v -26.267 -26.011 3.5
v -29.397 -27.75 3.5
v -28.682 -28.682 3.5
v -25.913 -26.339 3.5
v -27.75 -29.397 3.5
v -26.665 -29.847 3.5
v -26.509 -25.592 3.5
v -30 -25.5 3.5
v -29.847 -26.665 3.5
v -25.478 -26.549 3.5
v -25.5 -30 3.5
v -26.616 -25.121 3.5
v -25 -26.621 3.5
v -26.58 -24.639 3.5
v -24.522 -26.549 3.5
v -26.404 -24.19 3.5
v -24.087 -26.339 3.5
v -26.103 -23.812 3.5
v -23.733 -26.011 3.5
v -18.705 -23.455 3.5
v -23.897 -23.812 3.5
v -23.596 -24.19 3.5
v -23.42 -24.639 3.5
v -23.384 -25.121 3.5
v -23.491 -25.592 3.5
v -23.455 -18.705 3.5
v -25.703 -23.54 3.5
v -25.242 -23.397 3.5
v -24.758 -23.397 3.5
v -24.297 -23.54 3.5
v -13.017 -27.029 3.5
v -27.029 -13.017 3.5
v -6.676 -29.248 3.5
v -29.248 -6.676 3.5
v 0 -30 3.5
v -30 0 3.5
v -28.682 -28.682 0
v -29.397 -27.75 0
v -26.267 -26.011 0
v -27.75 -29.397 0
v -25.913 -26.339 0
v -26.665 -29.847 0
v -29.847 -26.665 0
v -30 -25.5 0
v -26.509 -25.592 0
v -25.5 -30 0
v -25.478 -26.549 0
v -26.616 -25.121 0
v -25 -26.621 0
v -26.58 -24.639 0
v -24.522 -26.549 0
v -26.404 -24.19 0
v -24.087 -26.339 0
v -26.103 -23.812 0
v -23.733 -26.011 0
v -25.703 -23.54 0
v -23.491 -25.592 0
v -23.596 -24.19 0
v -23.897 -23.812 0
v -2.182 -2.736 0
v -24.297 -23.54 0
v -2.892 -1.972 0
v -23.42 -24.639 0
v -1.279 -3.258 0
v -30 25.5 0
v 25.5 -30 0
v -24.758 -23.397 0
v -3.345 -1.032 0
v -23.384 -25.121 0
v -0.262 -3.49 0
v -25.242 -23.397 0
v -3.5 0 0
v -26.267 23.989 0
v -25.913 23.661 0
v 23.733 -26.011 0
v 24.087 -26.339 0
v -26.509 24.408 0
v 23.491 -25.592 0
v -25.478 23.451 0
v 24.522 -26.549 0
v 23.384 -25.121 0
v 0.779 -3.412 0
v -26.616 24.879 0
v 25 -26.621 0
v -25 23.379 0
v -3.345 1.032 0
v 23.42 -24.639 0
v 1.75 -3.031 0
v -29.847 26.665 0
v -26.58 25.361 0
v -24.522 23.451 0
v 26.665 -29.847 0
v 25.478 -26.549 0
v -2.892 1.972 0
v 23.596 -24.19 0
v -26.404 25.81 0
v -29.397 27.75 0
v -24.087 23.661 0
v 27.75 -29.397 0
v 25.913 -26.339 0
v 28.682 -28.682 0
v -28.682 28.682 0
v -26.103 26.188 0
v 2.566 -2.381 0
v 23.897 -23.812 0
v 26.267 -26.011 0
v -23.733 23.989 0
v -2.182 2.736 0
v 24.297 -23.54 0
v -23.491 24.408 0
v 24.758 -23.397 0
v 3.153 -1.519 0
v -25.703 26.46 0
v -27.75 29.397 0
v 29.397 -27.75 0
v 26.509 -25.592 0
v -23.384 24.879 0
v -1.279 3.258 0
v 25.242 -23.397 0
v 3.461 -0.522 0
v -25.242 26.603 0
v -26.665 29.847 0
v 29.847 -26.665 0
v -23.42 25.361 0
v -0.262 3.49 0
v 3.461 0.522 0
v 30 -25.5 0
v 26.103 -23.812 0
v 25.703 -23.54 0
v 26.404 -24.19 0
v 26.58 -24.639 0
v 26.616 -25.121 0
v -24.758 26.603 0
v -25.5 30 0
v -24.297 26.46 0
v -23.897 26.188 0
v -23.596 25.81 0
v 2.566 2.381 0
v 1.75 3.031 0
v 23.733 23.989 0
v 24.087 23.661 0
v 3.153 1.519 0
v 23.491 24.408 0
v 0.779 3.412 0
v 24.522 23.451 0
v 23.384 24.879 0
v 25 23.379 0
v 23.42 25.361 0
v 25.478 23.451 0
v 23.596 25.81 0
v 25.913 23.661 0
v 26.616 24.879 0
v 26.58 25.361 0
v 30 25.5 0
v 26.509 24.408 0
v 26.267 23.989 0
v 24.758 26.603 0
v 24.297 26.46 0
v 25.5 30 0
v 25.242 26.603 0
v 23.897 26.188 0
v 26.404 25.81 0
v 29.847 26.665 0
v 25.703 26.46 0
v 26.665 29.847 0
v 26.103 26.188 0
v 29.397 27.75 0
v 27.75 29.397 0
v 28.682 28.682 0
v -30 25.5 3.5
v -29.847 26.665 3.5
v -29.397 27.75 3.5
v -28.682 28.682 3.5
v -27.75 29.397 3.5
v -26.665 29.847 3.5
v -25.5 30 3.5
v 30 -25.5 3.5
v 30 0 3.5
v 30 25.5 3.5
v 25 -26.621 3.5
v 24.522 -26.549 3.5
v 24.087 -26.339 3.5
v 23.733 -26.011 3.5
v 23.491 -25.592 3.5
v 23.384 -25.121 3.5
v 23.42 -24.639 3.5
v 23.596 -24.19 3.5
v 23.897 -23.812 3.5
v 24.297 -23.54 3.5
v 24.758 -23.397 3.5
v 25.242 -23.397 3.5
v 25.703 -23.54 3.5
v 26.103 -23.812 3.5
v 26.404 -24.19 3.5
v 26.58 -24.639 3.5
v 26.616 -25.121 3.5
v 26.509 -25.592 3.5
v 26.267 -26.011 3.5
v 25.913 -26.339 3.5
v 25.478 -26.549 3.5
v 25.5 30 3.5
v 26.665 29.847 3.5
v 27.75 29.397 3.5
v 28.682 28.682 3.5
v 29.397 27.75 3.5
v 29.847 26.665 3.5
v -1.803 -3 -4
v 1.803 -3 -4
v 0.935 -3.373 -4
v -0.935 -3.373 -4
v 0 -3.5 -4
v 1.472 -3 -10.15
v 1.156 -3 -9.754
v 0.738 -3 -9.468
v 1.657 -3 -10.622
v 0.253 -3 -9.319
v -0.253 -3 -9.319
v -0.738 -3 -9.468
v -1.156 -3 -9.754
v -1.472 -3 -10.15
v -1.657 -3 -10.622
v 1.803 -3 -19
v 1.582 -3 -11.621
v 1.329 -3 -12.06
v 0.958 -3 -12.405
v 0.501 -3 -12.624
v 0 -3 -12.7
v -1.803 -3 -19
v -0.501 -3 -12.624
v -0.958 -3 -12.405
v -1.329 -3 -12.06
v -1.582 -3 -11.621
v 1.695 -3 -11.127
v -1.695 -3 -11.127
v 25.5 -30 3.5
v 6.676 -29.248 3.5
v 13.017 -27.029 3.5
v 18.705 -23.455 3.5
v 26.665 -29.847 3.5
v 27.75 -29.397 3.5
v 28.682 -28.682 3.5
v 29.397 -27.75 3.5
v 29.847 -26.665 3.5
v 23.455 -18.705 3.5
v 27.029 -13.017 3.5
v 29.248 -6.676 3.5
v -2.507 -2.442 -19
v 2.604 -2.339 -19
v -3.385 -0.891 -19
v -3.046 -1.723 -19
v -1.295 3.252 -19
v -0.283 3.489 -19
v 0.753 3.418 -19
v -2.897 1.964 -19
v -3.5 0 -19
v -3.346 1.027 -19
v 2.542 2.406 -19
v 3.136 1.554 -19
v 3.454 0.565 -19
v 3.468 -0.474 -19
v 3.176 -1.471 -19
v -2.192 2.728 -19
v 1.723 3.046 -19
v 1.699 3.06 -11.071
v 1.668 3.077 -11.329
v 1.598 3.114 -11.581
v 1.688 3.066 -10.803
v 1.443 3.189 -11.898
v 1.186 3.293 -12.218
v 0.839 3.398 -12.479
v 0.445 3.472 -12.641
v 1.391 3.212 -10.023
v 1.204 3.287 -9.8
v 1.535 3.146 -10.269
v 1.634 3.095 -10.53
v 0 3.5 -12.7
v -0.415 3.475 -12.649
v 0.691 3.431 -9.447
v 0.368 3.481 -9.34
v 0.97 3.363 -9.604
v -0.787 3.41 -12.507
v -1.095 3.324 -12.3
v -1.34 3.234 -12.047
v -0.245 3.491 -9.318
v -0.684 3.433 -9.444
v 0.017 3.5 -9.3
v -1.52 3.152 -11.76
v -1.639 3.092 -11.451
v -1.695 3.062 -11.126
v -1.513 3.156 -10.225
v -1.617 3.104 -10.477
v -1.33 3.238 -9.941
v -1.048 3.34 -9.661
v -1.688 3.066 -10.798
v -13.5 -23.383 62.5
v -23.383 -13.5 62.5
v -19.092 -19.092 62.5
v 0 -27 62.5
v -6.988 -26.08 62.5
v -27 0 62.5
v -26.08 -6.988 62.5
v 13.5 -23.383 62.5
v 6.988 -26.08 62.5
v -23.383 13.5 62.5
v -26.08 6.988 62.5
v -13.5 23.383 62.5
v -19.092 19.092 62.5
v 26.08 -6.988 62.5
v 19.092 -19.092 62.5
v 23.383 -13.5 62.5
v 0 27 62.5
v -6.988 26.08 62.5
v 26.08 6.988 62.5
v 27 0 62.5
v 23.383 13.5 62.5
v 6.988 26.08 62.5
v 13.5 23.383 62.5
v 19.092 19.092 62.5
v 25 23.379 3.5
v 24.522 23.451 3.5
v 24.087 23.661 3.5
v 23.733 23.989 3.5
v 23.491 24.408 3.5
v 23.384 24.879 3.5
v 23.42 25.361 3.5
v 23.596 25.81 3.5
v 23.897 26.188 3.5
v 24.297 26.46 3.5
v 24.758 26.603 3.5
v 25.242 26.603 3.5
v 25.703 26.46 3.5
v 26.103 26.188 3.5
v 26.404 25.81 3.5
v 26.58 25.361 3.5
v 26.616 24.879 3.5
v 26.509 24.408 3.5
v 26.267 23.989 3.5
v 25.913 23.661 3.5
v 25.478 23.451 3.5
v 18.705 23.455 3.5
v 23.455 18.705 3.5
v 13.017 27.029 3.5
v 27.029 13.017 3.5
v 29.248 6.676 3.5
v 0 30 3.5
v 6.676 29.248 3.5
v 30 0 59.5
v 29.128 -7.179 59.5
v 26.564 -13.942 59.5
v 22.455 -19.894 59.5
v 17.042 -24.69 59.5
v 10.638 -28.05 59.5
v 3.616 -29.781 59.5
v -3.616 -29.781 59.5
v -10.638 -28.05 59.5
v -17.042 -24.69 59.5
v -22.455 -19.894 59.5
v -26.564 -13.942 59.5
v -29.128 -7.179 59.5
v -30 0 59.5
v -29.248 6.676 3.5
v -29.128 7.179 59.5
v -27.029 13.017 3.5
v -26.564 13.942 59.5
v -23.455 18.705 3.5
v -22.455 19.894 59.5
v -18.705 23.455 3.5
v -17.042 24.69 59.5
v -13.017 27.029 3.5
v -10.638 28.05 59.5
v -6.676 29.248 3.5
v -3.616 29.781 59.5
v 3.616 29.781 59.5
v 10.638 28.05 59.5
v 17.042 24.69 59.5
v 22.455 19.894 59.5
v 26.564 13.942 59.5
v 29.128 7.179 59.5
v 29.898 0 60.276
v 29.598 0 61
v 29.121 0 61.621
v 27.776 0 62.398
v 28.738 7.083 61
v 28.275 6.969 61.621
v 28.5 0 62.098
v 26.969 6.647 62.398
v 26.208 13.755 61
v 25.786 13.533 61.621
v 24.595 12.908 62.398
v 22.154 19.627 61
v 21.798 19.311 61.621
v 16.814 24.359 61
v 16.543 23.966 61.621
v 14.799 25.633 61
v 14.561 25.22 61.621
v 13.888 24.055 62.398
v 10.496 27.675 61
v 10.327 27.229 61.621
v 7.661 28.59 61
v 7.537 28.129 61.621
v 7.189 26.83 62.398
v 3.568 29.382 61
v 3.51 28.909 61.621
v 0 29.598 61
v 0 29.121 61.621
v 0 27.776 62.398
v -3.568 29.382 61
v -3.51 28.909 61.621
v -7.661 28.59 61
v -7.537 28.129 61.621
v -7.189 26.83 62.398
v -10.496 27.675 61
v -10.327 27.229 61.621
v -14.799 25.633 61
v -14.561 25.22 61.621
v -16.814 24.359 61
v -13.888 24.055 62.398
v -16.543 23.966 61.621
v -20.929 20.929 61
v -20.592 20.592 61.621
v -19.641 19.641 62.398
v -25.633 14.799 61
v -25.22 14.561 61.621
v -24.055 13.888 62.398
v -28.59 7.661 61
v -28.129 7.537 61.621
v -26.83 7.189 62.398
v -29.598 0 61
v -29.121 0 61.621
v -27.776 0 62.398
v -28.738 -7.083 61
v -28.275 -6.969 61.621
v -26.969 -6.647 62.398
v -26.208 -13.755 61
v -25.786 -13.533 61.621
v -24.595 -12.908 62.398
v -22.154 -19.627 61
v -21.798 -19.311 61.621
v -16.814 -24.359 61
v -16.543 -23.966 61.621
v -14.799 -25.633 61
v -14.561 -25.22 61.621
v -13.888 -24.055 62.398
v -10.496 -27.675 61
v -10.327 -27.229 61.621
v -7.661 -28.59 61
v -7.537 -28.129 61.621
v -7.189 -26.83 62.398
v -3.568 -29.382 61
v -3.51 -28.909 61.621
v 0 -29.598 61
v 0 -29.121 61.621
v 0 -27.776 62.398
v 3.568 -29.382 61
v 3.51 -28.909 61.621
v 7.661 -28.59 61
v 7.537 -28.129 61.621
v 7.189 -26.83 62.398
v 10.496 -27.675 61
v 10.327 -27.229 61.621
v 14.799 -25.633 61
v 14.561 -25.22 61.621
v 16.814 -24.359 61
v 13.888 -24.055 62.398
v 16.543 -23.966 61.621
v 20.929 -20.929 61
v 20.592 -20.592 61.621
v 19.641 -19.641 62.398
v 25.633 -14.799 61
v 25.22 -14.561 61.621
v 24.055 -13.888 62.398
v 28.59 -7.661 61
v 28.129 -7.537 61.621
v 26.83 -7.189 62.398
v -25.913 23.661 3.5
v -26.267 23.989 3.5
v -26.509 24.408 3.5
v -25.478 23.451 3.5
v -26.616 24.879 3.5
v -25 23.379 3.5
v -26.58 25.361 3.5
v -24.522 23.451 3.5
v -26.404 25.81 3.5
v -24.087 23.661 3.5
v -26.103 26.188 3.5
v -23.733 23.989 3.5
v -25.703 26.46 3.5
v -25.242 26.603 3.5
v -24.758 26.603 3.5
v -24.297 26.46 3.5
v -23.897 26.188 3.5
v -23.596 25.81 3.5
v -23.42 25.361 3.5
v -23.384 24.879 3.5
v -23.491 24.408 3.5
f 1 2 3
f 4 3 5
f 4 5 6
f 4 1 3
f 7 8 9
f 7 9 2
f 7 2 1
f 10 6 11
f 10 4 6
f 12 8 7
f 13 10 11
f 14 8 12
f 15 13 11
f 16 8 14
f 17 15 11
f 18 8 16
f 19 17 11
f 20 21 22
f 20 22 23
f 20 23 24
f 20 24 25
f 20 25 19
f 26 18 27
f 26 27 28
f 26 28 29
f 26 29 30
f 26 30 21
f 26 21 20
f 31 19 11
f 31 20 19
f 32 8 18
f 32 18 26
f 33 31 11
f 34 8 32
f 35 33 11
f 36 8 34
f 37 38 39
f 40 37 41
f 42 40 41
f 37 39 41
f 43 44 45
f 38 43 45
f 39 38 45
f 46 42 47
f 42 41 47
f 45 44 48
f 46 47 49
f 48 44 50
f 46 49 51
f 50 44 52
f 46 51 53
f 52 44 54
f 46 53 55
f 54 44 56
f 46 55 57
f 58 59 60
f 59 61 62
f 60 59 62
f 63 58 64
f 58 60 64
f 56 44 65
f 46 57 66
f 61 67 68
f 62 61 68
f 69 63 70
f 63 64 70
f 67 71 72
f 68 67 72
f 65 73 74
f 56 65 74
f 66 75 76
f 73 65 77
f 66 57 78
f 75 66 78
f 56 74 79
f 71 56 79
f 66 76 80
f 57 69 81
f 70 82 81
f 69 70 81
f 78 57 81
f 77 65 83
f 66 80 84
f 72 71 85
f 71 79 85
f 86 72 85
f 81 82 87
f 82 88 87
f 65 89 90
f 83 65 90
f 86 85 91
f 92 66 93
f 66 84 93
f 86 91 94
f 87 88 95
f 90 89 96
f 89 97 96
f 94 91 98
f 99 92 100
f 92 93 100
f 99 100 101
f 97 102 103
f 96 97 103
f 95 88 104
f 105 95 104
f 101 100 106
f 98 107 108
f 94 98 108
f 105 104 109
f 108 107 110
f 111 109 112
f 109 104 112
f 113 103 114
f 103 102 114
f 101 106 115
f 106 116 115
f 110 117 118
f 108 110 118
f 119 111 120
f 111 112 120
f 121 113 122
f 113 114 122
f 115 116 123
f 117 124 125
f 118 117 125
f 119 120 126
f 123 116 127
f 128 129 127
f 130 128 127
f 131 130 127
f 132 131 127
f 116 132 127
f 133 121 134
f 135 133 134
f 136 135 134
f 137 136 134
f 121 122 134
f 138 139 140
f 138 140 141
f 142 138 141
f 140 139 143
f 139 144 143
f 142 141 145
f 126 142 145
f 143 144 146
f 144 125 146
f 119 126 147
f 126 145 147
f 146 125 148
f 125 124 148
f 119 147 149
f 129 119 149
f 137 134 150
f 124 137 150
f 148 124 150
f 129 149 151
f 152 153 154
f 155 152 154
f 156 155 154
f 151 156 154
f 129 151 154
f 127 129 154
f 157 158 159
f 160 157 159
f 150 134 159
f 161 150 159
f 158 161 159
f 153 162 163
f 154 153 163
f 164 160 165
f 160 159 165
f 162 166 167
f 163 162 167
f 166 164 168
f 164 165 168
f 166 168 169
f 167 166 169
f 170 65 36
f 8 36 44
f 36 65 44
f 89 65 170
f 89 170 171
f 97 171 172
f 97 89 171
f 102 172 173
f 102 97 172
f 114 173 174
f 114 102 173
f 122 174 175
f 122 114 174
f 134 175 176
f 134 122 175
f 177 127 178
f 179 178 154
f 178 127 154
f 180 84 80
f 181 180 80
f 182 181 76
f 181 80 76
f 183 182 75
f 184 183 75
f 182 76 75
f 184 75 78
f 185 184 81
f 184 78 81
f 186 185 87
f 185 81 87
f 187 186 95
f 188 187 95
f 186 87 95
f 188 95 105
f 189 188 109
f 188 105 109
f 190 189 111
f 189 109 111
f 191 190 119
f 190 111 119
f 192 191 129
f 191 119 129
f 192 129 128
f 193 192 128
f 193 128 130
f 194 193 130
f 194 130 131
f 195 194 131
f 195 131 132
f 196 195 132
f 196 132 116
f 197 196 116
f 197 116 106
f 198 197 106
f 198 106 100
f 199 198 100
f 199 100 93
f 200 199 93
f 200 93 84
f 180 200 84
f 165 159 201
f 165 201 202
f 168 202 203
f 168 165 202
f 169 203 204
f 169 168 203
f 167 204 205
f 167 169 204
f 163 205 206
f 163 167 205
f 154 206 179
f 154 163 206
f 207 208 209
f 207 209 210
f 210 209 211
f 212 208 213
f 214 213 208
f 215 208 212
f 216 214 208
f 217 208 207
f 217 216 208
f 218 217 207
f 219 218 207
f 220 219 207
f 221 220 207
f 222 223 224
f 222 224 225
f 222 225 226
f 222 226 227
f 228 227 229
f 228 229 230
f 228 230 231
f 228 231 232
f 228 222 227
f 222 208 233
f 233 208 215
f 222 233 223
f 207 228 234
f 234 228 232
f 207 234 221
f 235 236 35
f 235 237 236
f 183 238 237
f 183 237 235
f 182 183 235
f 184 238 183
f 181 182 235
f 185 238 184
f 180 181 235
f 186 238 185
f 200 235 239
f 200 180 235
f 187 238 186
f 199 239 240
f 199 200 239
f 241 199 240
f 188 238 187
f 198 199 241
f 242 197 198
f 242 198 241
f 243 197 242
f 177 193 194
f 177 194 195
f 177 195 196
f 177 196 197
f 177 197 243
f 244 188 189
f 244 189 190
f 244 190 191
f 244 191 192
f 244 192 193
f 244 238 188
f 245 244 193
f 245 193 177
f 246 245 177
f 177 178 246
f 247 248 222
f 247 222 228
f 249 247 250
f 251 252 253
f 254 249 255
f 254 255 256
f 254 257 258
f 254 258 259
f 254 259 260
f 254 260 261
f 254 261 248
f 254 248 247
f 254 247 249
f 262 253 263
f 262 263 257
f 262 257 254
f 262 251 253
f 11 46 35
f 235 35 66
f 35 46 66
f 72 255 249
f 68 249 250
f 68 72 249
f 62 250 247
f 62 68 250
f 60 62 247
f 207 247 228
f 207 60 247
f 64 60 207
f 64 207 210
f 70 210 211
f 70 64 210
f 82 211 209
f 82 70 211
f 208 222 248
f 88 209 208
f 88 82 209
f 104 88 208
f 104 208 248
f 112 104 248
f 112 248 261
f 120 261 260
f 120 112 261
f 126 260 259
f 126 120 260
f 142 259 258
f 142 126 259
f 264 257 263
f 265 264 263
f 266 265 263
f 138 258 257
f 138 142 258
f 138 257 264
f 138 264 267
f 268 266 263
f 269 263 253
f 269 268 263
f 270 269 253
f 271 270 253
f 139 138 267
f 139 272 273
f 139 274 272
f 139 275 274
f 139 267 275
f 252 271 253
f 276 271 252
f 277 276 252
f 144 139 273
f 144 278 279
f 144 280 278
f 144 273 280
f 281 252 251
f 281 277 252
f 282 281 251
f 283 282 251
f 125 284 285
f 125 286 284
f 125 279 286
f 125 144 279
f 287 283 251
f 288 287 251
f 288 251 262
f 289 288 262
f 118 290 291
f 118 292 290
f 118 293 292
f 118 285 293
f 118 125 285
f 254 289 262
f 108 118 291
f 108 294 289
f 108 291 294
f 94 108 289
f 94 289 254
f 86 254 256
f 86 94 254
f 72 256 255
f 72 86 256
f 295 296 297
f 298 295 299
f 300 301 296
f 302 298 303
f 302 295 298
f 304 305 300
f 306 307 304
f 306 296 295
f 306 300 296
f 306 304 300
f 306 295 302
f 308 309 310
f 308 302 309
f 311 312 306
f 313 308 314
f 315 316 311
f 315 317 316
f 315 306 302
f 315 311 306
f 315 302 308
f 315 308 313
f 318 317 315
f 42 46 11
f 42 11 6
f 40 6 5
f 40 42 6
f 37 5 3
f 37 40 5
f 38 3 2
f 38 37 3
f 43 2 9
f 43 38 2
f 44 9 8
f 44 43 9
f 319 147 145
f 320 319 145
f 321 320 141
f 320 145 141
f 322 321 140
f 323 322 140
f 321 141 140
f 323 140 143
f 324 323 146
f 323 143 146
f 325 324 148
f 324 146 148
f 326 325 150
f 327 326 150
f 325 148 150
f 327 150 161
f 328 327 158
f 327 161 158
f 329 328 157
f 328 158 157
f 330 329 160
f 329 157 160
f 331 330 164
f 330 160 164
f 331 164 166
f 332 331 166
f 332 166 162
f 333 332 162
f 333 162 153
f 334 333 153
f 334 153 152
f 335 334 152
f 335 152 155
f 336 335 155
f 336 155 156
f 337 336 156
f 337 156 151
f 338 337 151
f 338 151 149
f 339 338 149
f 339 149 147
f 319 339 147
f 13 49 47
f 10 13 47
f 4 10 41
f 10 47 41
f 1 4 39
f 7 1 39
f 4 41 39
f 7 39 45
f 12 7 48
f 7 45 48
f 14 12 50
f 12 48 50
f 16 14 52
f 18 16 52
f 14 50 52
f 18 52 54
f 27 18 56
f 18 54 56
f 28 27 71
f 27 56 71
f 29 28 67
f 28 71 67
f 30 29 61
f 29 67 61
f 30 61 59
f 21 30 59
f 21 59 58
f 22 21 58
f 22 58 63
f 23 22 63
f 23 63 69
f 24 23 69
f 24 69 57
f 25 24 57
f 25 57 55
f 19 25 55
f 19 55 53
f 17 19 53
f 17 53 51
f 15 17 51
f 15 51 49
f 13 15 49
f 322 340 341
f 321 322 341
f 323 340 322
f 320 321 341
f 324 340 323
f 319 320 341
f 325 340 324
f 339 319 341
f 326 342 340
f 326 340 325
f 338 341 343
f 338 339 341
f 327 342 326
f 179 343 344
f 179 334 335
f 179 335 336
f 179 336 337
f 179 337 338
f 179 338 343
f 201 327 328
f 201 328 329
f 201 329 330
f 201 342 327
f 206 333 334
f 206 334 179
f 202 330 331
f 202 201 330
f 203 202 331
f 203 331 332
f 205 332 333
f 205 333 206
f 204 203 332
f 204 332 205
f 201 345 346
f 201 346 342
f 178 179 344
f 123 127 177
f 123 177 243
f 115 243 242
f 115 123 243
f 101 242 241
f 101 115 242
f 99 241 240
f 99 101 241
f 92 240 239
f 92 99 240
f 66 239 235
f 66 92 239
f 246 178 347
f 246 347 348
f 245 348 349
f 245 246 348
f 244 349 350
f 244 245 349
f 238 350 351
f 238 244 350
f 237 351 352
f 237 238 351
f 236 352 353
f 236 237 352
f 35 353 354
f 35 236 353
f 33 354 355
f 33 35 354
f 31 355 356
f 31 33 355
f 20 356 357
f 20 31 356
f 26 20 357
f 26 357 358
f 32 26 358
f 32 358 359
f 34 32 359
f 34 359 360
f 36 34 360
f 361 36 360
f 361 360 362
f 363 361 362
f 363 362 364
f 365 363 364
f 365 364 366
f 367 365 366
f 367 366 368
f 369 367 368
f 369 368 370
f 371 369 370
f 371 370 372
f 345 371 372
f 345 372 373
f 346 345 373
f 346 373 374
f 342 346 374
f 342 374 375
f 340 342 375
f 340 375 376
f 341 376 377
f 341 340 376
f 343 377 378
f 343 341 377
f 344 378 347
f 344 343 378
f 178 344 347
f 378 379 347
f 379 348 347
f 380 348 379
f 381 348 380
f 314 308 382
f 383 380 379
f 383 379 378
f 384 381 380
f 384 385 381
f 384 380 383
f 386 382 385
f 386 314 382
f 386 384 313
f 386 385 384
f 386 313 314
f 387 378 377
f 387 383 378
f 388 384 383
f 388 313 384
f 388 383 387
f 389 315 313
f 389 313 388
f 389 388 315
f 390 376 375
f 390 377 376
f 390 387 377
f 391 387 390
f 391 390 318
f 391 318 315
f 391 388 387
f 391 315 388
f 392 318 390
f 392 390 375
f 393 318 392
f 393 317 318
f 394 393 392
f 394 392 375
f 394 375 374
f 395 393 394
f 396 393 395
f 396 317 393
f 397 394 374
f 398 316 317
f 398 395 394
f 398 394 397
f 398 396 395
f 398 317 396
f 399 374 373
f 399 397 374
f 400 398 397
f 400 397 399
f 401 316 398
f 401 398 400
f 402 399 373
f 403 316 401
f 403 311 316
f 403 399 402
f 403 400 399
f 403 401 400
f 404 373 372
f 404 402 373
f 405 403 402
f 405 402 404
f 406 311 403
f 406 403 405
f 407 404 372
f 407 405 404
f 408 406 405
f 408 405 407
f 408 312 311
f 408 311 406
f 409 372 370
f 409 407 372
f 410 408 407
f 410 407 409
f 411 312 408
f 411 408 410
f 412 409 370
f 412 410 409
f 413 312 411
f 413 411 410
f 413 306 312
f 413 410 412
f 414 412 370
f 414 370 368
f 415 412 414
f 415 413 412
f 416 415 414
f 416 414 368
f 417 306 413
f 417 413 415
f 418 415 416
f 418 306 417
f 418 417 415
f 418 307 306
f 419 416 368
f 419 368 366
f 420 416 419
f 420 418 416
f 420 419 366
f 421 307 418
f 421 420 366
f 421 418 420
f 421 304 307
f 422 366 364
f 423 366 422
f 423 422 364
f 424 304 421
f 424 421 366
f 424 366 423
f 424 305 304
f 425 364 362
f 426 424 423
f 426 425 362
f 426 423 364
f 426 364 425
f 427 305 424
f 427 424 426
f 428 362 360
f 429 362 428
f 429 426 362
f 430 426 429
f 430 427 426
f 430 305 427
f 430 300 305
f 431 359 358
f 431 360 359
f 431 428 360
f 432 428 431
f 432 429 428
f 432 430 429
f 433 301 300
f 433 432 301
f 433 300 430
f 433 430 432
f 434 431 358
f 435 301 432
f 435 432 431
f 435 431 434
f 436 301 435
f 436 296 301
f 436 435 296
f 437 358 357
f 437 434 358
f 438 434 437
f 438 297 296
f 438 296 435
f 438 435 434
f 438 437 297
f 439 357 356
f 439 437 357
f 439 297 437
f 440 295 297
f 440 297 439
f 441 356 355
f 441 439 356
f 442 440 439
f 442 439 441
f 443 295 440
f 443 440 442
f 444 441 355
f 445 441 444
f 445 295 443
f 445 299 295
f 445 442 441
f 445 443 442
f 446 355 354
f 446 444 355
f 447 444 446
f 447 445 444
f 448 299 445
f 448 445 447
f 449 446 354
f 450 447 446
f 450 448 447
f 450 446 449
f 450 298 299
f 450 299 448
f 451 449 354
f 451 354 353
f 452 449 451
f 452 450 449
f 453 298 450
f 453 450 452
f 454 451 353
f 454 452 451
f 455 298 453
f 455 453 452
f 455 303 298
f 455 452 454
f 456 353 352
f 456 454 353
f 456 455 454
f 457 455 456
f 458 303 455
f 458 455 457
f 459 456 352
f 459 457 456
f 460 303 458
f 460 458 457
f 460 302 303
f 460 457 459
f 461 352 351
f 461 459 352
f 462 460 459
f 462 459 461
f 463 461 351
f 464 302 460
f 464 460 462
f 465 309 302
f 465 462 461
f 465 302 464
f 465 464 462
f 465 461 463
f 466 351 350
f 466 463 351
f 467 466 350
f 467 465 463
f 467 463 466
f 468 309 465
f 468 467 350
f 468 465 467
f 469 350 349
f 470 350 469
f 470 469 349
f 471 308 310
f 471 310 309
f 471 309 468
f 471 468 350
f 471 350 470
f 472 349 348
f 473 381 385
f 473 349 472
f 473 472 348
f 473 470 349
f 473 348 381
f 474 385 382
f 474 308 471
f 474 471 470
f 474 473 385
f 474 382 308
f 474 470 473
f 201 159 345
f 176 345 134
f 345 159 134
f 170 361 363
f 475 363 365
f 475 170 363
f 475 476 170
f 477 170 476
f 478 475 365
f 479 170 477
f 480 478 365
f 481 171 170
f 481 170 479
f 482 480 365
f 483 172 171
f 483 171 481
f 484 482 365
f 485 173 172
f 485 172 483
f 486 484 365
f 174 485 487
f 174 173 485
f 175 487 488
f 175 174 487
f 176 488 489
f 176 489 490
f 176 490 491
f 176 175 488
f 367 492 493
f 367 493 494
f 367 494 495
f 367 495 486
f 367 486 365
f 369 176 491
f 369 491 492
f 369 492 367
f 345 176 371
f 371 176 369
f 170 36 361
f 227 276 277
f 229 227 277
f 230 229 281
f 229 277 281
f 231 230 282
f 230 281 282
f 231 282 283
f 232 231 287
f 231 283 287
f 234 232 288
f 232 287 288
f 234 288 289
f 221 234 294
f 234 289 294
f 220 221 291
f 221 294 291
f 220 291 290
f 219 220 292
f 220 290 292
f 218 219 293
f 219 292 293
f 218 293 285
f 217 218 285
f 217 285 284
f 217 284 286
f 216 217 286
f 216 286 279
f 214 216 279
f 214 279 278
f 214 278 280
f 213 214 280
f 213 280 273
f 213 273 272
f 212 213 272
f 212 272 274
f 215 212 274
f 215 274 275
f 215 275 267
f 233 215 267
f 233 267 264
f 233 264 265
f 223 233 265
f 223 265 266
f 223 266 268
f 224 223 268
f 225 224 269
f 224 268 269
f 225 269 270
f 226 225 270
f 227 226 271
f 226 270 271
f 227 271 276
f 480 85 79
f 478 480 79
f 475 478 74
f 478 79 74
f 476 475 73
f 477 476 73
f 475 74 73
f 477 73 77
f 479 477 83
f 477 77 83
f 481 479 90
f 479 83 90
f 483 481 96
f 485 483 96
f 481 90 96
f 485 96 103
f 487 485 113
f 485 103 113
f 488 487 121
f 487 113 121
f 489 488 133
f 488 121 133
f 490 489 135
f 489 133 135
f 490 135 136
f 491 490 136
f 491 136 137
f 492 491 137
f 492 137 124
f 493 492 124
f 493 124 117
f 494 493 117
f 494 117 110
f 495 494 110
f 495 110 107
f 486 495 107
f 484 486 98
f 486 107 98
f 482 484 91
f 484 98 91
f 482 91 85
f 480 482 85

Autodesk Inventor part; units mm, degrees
ref_plane "YZ Plane" through (0, 0, 0) normal (1, 0, 0) x (0, 1, 0)
ref_plane "XZ Plane" through (0, 0, 0) normal (0, 1, 0) x (-1, 0, 0)
ref_plane "XY Plane" through (0, 0, 0) normal (0, 0, 1) x (1, 0, 0)
sketch "Esquisse1" plane through (0, 0, 0) normal (0, 0, 1) x (1, 0, 0)
  line L0 (-25.5, -30) -> (25.5, -30)
  line L1 (30, -25.5) -> (30, 25.5)
  line L2 (25.5, 30) -> (-25.5, 30)
  line L3 (-30, 25.5) -> (-30, -25.5)
  line L4 (-30, -30) -> (30, 30) construction
  line L5 (30, -30) -> (-30, 30) construction
  arc A0 (-30, -25.5) -> (-25.5, -30) centre (-25.5, -25.5) ccw
  arc A1 (25.5, -30) -> (30, -25.5) centre (25.5, -25.5) ccw
  arc A2 (30, 25.5) -> (25.5, 30) centre (25.5, 25.5) ccw
  arc A3 (-25.5, 30) -> (-30, 25.5) centre (-25.5, 25.5) ccw
  point P0 (0, 0)
  dimension "d0" = 60
  dimension "d1" = 60
  dimension "d2" = 4.5
extrude "Embase" add sketch "Esquisse1" along normal blind 3.5
sketch "Esquisse3" plane through (0, 0, 3.5) normal (0, 0, 1) x (1, 0, 0)
  point P0 (0, 0)
  point P1 (-25, -25)
  point P2 (-25, 25)
  point P3 (25, 25)
  point P4 (25, -25)
  dimension "Entraxe_moteur" = 50
  dimension "d8" = 50
  dimension "d9" = 25
  dimension "d10" = 25
hole "Perçage1" at (-25, -25, 3.5) at (-25, 25, 3.5) at (25, 25, 3.5) at (25, -25, 3.5) direction (0, 0, -1) diameter 3.242 end through all thread size "M4x0.7" class "6H" standard "ISO Metric profile"
sketch "Esquisse2" plane through (0, 0, 3.5) normal (0, 0, 1) x (1, 0, 0)
  circle A0 centre (0, 0) radius 30
  line L0 (-30, 25.5) -> (-30, -25.5) projected
extrude "Extrusion2" add sketch "Esquisse2" along normal blind 59
fillet "Congé1" radius 3 1 edges at (-30, 0, 62.5)
sketch "Esquisse4" plane through (0, 0, 0) normal (0, 0, -1) x (-1, 0, 0)
  circle A0 centre (0, 0) radius 3.5
  dimension "d19" = 7
extrude "Extrusion3" add sketch "Esquisse4" along normal blind 19
sketch "Esquisse5" plane through (0, 0, -19) normal (0, 0, -1) x (-1, 0, 0)
  line L0 (-1.8028, -3) -> (1.8028, -3)
  circle A0 centre (0, 0) radius 3.5 projected
  dimension "d22" = 6.5
extrude "Extrusion4" cut sketch "Esquisse5" against normal blind 15 contours L0 A0 picked at (0.3722, -3.1057)
sketch "Esquisse6" plane through (-1.8028, -3, -19) normal (0, -1, 0) x (1, 0, 0)
  line L0 (3.6056, 0) -> (0, 0) projected
  point P0 (1.8028, 19)
  point P1 (1.8028, 8)
  point P2 (1.8028, 0)
  dimension "d25" = 8
hole "Perçage2" at (0, -3, -11) direction (0, 1, 0) diameter 3.4 end through all clearance for "Vis à tête plate fraisée ISO 2009/7046" size "M3" standard "ISO"
equation "\"d8\" = Entraxe_moteur"
equation "\"d9\" = 0.5 * Entraxe_moteur"
equation "\"d10\" = 0.5 * Entraxe_moteur"
properties part number "Moteur" material "Acier inoxydable"
